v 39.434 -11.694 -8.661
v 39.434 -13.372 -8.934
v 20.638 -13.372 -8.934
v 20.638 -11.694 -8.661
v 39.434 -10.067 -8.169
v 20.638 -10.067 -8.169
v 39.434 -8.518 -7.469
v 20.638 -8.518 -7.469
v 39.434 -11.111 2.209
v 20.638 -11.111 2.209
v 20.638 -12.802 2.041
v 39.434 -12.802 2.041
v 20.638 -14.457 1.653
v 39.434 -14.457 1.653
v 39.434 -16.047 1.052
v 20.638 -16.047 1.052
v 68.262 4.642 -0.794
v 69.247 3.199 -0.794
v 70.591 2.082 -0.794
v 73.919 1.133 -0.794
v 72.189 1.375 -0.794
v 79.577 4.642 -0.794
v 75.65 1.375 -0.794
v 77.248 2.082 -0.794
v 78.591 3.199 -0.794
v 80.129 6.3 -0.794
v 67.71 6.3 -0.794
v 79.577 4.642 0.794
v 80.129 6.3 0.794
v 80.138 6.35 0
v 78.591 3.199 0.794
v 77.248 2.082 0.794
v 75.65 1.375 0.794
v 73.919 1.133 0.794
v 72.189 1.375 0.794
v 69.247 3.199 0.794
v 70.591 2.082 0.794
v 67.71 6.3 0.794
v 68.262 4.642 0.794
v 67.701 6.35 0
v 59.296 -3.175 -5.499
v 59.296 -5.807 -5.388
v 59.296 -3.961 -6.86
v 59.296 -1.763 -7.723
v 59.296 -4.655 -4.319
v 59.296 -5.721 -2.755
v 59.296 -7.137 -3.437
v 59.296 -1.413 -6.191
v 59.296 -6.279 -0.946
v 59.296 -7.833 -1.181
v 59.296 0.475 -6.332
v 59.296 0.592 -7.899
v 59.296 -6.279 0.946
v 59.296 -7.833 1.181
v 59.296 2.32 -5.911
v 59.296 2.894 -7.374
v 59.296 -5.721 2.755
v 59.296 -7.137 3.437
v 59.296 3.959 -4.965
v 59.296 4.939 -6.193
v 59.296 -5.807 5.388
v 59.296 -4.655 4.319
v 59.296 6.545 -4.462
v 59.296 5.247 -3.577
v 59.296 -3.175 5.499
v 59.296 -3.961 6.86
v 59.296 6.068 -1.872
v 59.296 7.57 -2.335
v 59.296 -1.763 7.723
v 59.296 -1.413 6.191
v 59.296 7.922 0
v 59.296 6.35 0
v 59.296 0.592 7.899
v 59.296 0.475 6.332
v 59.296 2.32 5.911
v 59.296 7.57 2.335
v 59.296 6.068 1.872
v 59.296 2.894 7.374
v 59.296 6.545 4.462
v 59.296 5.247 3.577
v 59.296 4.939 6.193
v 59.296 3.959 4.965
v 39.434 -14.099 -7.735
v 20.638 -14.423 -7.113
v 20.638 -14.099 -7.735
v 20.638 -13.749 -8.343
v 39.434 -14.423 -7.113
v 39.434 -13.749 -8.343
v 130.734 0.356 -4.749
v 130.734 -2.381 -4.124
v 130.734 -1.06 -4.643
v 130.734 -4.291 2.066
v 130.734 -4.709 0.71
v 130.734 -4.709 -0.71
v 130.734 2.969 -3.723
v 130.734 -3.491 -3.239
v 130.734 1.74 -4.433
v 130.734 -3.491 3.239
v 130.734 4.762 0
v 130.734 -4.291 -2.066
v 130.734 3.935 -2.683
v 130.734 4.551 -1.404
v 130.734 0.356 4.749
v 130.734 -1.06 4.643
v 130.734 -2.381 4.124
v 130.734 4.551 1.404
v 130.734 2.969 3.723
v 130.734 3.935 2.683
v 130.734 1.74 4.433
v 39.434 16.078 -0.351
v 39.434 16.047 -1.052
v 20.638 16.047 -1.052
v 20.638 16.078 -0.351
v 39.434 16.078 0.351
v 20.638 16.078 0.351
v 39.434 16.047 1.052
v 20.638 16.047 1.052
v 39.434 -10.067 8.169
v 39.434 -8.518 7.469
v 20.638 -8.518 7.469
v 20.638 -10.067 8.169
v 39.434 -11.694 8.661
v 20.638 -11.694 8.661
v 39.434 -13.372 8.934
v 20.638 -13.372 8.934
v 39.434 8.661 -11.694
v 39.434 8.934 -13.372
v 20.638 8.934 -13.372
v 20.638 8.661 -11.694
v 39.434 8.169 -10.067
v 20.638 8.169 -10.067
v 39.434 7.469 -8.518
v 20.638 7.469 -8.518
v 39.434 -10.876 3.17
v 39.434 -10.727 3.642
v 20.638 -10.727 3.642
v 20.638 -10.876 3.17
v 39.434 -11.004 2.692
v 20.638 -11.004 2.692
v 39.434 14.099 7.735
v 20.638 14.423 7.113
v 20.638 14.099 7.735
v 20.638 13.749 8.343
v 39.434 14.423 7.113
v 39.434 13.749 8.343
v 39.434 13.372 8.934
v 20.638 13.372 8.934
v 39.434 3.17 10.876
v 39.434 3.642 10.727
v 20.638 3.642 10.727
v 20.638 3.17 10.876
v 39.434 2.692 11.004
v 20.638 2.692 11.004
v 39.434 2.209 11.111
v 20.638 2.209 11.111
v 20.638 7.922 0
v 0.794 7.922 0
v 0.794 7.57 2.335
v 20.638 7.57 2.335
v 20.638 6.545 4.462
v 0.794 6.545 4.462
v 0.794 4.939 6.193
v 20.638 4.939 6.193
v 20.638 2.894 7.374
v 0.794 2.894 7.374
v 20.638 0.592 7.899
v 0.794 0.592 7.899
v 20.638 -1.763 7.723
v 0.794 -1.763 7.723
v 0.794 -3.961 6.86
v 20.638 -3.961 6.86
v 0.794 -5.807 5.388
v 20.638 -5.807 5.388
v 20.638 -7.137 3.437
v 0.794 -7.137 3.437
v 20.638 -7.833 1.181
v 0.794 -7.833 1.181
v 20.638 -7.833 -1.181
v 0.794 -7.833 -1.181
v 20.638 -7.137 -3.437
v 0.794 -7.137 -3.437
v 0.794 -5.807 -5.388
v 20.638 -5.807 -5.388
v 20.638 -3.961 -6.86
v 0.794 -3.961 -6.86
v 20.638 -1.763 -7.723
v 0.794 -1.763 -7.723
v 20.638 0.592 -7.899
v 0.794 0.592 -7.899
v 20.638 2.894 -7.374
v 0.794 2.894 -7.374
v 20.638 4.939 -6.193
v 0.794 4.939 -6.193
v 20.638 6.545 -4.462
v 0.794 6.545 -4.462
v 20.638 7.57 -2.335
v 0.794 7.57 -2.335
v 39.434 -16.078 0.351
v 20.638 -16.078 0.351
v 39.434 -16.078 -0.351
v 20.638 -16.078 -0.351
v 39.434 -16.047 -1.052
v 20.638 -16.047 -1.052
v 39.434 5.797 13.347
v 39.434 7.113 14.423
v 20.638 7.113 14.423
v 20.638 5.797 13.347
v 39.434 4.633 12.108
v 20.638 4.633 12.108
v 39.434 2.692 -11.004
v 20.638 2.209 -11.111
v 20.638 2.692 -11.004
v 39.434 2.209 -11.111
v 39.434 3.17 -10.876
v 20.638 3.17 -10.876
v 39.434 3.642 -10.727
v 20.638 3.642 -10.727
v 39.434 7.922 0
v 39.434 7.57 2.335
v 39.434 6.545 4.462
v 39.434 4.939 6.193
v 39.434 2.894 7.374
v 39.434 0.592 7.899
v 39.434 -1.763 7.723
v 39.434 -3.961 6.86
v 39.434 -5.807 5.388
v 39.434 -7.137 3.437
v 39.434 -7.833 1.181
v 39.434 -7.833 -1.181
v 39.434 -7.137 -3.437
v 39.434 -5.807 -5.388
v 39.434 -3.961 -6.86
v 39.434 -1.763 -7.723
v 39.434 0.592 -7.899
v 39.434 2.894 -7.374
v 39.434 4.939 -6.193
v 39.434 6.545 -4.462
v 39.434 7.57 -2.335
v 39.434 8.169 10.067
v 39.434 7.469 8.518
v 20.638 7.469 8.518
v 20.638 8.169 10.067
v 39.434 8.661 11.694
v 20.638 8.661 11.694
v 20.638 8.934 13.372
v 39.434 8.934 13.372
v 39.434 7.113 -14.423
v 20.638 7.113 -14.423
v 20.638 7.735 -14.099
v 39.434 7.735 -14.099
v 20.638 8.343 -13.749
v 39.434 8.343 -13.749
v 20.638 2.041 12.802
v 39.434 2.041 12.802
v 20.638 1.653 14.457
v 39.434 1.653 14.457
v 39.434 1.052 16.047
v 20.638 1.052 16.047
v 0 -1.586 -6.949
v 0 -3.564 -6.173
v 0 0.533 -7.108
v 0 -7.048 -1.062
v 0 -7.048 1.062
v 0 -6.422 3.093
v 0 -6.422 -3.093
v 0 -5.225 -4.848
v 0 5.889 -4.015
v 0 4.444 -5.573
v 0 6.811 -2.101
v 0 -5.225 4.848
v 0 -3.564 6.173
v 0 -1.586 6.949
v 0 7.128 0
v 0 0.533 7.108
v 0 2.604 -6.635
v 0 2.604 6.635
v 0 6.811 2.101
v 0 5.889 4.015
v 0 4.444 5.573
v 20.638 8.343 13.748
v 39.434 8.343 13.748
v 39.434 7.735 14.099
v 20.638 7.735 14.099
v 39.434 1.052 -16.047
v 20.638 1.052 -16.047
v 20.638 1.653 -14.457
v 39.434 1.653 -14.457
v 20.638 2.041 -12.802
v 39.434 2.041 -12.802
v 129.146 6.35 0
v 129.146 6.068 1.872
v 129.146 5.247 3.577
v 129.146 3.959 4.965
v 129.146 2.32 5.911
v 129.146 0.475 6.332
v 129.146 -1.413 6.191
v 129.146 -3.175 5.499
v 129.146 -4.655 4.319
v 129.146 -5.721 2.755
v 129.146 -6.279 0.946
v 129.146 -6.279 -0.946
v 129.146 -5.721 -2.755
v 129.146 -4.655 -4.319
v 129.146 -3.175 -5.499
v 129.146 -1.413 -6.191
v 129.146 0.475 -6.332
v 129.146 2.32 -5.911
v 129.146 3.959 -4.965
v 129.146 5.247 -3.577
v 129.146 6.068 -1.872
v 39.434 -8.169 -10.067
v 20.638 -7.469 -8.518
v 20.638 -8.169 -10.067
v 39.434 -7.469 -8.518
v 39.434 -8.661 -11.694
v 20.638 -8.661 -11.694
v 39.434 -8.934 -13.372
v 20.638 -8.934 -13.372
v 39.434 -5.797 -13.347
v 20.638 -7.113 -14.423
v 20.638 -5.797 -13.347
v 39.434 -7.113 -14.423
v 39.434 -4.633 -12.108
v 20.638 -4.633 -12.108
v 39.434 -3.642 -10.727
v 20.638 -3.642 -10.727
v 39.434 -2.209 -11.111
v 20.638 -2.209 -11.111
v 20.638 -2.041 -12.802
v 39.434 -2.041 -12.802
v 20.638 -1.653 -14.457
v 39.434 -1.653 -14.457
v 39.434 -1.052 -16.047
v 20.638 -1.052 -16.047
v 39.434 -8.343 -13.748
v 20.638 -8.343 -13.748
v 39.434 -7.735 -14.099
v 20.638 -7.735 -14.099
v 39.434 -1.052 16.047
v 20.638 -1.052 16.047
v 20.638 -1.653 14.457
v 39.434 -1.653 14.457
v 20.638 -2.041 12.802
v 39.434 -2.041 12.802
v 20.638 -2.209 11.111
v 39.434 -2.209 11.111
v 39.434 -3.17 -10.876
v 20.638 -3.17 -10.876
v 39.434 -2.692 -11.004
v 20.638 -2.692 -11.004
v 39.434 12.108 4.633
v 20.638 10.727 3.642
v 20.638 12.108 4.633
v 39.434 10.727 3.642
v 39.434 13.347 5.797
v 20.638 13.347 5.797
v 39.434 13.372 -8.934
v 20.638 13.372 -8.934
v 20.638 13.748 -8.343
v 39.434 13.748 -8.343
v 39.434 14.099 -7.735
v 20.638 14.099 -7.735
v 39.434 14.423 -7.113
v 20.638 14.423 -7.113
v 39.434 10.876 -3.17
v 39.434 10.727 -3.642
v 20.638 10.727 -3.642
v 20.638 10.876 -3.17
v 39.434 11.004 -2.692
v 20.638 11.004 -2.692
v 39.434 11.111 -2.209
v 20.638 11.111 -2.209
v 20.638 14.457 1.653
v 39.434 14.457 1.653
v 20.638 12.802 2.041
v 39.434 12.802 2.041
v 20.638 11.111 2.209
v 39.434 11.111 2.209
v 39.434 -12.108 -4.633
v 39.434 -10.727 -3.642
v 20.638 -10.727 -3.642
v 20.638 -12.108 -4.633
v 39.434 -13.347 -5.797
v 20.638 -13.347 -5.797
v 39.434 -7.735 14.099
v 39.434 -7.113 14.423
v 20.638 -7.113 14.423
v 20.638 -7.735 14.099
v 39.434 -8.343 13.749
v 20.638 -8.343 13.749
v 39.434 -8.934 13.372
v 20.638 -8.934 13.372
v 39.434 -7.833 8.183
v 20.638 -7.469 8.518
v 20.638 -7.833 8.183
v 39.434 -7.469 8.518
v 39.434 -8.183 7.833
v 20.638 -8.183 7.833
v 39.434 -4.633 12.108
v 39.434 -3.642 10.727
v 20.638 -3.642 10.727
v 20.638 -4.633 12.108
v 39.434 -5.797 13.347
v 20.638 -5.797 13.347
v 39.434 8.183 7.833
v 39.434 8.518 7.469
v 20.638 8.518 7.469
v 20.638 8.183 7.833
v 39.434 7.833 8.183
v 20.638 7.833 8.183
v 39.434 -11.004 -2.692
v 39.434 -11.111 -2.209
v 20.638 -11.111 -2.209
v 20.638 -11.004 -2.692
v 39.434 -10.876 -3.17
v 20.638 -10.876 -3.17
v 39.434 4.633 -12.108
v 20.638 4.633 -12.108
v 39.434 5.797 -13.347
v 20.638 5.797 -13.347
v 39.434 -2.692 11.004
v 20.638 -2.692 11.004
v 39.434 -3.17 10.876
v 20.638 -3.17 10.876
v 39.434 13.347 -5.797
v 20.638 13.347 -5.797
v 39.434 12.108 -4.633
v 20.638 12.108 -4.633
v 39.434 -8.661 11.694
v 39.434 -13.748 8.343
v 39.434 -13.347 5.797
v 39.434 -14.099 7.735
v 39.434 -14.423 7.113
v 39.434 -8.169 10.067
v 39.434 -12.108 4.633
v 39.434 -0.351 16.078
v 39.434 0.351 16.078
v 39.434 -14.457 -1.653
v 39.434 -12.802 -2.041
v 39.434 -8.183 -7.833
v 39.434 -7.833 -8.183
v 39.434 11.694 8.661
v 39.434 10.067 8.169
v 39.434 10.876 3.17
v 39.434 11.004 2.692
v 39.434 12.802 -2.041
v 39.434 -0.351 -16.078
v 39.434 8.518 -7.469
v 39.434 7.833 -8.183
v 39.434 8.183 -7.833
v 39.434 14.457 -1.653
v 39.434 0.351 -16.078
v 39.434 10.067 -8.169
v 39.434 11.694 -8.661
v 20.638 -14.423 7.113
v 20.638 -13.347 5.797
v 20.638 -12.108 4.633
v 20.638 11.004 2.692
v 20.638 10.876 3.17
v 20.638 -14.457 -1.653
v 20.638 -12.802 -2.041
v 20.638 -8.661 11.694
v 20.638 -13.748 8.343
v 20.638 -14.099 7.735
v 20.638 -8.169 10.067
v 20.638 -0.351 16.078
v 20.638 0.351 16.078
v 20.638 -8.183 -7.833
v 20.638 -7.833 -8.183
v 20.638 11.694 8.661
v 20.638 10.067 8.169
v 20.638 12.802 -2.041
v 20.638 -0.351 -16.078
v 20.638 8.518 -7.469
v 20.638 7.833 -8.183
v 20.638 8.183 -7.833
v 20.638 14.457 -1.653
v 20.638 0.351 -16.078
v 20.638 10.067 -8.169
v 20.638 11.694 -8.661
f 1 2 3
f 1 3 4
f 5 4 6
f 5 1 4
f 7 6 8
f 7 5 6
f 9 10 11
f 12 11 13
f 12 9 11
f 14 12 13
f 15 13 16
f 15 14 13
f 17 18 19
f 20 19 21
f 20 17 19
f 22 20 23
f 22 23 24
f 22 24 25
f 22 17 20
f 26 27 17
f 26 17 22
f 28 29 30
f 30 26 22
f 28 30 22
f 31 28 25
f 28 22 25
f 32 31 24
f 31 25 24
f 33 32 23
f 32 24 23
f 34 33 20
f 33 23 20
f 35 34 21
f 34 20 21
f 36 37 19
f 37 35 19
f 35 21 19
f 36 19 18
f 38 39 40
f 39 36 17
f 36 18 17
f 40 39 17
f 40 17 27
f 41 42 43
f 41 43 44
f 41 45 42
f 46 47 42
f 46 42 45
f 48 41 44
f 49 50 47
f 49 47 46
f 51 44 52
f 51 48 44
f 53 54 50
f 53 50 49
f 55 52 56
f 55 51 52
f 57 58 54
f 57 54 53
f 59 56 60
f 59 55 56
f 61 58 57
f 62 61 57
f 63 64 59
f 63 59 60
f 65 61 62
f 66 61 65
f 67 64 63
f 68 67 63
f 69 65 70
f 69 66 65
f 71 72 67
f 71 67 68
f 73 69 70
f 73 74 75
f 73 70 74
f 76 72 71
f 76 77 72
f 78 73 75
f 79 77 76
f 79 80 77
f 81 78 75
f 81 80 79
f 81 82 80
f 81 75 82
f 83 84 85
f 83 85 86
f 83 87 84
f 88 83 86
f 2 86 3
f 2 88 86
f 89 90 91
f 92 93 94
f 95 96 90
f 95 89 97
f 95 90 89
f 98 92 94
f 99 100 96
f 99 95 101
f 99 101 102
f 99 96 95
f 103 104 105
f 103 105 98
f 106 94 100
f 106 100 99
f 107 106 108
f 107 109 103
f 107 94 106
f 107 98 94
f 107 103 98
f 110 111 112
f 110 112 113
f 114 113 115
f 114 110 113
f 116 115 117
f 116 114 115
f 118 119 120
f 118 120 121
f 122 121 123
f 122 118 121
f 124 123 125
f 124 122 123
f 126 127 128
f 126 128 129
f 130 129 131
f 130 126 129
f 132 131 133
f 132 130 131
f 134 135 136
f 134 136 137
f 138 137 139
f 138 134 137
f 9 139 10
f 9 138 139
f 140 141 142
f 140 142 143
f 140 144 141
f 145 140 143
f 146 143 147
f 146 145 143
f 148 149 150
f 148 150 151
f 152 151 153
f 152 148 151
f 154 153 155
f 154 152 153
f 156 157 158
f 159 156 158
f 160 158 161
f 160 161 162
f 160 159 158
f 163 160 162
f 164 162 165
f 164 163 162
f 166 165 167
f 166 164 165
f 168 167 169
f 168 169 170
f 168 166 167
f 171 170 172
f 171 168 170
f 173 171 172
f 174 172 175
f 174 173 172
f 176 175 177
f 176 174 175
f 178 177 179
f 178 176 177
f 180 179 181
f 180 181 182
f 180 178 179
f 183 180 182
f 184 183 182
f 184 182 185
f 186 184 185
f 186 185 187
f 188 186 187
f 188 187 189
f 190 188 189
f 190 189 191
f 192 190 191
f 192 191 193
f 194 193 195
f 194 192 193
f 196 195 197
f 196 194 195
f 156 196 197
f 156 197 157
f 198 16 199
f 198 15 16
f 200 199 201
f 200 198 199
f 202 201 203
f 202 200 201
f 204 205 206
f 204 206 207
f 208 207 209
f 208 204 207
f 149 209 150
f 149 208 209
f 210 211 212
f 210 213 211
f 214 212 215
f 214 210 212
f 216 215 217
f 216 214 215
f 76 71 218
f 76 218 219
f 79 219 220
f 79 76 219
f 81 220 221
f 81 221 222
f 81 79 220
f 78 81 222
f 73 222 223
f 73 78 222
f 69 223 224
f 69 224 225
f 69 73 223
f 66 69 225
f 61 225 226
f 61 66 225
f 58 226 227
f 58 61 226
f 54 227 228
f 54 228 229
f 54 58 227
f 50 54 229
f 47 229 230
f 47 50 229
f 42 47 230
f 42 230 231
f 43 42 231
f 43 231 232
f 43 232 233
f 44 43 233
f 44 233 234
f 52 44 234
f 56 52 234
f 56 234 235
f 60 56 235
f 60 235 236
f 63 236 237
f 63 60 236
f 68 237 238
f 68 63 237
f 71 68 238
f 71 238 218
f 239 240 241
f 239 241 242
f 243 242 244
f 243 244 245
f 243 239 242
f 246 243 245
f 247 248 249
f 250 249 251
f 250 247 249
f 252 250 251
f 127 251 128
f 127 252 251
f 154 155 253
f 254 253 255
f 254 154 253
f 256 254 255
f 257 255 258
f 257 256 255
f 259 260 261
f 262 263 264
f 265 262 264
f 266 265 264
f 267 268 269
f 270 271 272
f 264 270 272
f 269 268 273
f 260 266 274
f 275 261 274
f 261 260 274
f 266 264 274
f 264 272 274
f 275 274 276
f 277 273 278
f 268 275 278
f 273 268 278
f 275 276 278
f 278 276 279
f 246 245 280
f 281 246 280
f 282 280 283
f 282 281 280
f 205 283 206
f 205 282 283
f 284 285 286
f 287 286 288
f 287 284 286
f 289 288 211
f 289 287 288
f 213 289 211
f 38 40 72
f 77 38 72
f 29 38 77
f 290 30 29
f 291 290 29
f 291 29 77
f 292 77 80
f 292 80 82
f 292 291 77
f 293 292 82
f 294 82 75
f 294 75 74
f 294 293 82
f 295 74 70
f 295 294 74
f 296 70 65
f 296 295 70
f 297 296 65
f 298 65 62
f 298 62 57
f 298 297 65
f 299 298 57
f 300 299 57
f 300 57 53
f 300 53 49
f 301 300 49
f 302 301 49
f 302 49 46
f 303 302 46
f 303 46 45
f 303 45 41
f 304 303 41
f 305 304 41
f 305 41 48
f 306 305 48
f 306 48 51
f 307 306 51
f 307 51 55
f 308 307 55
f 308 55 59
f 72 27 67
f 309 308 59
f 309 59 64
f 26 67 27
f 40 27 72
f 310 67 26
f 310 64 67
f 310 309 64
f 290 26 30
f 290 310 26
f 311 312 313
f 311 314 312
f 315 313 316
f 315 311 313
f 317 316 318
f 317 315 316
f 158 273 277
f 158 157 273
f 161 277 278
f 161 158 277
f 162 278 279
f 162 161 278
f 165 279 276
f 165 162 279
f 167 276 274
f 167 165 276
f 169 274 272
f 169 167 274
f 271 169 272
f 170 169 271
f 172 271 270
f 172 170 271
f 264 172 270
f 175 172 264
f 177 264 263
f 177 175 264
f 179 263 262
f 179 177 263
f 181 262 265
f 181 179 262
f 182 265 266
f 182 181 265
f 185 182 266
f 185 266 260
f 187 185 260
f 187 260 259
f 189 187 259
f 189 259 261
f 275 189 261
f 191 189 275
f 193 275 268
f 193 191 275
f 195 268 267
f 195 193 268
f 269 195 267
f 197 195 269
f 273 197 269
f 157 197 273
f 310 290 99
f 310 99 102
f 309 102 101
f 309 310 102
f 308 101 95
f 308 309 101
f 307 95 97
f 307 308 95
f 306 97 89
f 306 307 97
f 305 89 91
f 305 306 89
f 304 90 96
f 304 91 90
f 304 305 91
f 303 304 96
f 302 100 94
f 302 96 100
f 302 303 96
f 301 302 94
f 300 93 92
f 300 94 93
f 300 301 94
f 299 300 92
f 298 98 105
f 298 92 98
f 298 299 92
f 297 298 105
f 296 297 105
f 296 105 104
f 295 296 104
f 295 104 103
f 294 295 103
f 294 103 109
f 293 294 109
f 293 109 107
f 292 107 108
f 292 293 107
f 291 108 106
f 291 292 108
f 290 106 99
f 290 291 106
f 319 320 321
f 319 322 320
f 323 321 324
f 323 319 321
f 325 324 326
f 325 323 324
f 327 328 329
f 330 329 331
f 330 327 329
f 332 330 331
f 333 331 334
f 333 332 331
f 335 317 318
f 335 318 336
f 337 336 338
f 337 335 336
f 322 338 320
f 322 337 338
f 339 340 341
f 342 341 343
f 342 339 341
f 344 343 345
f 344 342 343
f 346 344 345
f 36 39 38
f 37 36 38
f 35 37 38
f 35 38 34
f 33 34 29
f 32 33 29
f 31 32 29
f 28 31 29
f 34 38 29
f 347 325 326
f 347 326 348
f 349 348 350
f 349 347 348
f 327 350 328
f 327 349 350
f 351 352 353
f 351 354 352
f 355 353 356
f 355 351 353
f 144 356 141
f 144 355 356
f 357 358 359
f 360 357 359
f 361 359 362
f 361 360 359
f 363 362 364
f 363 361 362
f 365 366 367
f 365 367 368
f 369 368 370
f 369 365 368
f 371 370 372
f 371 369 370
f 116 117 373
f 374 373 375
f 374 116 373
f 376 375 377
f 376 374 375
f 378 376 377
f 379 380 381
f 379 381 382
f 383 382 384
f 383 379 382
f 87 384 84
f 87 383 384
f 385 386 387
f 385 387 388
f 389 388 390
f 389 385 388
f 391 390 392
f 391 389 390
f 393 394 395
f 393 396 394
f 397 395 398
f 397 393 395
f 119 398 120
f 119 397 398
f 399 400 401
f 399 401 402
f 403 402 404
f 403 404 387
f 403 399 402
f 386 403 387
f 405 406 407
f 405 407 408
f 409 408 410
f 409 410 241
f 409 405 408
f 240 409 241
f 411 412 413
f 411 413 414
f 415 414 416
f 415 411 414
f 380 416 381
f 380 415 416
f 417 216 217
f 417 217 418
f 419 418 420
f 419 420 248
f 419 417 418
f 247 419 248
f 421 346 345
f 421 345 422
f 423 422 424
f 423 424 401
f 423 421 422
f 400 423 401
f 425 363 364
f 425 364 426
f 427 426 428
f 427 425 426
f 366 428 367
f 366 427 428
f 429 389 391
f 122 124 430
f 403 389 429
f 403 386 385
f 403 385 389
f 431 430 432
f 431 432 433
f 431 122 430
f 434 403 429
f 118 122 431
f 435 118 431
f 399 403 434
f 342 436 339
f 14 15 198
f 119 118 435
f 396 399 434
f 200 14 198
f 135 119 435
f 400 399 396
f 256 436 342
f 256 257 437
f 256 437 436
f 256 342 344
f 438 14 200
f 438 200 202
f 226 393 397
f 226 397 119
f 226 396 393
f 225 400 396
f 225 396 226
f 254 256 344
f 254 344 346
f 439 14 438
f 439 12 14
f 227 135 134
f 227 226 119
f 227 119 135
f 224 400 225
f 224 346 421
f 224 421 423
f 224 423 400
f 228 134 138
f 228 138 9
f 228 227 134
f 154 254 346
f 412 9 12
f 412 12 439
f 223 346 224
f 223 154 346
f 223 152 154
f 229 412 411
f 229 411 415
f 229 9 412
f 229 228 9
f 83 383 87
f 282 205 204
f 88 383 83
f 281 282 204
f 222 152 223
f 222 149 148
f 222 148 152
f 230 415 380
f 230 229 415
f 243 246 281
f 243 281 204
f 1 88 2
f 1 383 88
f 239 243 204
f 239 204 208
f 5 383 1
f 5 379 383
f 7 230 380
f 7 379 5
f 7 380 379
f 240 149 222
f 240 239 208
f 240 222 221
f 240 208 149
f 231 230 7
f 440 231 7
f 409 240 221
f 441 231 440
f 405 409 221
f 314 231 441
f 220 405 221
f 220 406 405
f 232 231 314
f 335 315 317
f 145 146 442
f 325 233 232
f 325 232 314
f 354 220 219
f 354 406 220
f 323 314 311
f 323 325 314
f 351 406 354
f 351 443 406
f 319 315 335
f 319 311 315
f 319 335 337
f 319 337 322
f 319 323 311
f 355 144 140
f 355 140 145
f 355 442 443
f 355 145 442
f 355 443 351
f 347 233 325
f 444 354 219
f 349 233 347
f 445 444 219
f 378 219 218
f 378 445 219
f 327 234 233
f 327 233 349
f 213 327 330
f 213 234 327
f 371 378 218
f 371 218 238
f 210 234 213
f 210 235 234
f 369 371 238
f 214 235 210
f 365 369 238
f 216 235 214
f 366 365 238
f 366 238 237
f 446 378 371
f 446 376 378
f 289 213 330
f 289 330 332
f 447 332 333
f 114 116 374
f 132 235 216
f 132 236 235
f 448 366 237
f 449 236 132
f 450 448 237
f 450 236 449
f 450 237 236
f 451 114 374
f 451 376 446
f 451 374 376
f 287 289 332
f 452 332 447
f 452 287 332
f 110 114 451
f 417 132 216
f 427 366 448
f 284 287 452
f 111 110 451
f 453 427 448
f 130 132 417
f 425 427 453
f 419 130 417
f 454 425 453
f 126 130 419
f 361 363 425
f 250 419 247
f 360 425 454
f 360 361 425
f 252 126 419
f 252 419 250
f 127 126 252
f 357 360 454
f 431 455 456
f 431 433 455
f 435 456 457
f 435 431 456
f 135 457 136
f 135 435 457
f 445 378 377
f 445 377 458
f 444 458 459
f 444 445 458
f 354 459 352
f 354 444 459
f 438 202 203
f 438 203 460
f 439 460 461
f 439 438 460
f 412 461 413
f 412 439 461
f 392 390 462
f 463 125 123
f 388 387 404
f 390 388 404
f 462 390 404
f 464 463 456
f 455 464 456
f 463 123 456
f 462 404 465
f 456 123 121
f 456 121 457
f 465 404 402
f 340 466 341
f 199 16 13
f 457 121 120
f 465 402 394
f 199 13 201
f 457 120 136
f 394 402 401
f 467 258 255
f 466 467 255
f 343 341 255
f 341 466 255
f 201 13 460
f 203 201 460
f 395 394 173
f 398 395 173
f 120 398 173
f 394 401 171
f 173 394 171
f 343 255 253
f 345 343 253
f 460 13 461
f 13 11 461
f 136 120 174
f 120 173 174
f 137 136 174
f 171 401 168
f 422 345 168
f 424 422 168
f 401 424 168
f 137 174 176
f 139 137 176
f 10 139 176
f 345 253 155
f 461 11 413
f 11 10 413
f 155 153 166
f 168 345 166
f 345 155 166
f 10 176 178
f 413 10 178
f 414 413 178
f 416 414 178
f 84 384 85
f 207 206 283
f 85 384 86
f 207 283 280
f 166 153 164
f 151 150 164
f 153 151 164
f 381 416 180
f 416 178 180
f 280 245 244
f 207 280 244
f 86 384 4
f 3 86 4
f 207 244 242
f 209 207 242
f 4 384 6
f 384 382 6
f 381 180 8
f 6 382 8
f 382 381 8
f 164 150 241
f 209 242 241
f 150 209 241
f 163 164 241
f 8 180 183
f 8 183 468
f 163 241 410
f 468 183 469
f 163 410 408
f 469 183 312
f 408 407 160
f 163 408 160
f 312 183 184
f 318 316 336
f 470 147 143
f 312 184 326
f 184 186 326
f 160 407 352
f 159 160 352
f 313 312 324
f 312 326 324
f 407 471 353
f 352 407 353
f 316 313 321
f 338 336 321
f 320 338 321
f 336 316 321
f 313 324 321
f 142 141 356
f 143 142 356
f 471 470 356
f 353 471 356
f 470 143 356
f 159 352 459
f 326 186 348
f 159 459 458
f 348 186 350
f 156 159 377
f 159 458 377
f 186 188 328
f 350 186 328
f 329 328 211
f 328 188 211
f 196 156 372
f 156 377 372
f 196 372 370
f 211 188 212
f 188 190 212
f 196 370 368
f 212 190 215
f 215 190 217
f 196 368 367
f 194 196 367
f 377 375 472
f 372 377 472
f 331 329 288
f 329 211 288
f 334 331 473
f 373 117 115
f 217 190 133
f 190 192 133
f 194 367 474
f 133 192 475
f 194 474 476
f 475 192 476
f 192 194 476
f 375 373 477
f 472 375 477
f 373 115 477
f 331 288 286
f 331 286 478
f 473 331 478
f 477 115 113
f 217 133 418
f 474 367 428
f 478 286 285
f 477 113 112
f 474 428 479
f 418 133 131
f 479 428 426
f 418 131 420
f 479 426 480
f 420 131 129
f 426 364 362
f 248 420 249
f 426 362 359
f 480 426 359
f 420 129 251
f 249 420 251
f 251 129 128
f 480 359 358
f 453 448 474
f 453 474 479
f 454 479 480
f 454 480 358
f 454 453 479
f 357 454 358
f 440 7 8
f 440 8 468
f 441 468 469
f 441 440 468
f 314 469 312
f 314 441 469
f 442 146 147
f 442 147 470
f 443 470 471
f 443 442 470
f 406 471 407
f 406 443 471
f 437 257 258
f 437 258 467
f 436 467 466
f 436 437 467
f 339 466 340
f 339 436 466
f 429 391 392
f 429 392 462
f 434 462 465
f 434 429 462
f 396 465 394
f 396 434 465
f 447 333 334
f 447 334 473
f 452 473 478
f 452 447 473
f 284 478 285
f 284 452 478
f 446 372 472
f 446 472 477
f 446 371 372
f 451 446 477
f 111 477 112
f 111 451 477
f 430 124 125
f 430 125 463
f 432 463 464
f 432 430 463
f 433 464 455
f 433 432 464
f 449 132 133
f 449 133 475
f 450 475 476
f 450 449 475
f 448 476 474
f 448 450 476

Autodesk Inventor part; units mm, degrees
ref_plane "Start Plane" through (0, 0, 0) normal (1, 0, 0) x (0, 1, 0)
ref_plane "XZ Plane" through (0, 0, 0) normal (0, 1, 0) x (-1, 0, 0)
ref_plane "XY Plane" through (0, 0, 0) normal (0, 0, 1) x (1, 0, 0)
sketch "Main Sketch" plane through (0, 0, 0) normal (0, 0, 1) x (1, 0, 0)
  line L0 (0, 0) -> (130.7338, 0)
  line L1 (0, 0) -> (0, 7.9216)
  line L2 (0, 7.9216) -> (20.6375, 7.9216)
  line L3 (20.6375, 7.9216) -> (20.6375, 11.3284)
  line L4 (39.4335, 11.3284) -> (39.4335, 7.9216)
  line L5 (20.6375, 11.3284) -> (39.4335, 11.3284)
  line L6 (59.2963, 7.9216) -> (59.2963, 6.35)
  line L7 (39.4335, 7.9216) -> (59.2963, 7.9216)
  line L8 (130.7338, 6.35) -> (130.7338, 0)
  line L9 (59.2963, 6.35) -> (130.7338, 6.35)
  dimension "d3" = 15.8432
  dimension "d4" = 22.6568
  dimension "d5" = 15.8432
  dimension "d6" = 12.7
revolve "Revolution1" add sketch "Main Sketch" angle 360 about axis through (0, 0, 0) along (1, 0, 0)
chamfer "Chamfer1" distance 0.7937 angle 45 1 edges at (0, -7.9216, 0) measured on face at (13.7583, 7.8959, -0.6374)
chamfer "Chamfer2" distance 1.5875 angle 45 1 edges at (130.7338, -6.35, 0) measured on face at (106.9213, 6.2678, -1.0186)
thread "Thread1" size "1/2-13 UNC" class "2A" standard "ANSI Unified Screw Threads" length 25.4
sketch "Sketch3" plane through (0, 0, 0) normal (0, 0, 1) x (1, 0, 0)
  arc A0 (67.6045, 7.4481) -> (80.2341, 7.4481) centre (73.9193, 7.4481) ccw
  line L0 (67.6045, 7.4481) -> (80.2341, 7.4481)
  line L1 (59.2963, -7.9216) -> (59.2963, 7.9216) construction
  point P0 (0, 0)
  dimension "d16" = 14.623
  dimension "d17" = 6.3148
extrude "Extrusion1" cut sketch "Sketch3" along normal mid plane 1.5875
sketch "Sketch4" plane through (39.4335, 0, 0) normal (1, 0, 0) x (0, 0, -1)
  arc A0 (-8.9345, 13.3715) -> (-7.4665, 8.514) centre (3.948, 14.6141) ccw
  arc A1 (-7.4665, 8.514) -> (-8.514, 7.4665) centre (0, 0) ccw
  arc A2 (-8.514, 7.4665) -> (-13.3715, 8.9345) centre (-14.6141, -3.948) ccw
  arc A3 (-13.3715, 8.9345) -> (-14.4233, 7.1128) centre (0, 0) ccw
  arc A4 (-14.4233, 7.1128) -> (-10.7232, 3.64) centre (-3.888, 14.6302) ccw
  arc A5 (-10.7232, 3.64) -> (-11.1066, 2.2092) centre (0, 0) ccw
  arc A6 (-11.1066, 2.2092) -> (-16.0473, 1.0518) centre (-10.6822, -10.7261) ccw
  arc A7 (-16.0473, 1.0518) -> (-16.0473, -1.0518) centre (0, 0) ccw
  arc A8 (-16.0473, -1.0518) -> (-11.1066, -2.2092) centre (-10.6822, 10.7261) ccw
  arc A9 (-11.1066, -2.2092) -> (-10.7232, -3.64) centre (0, 0) ccw
  arc A10 (-10.7232, -3.64) -> (-14.4233, -7.1128) centre (-3.888, -14.6302) ccw
  arc A11 (-14.4233, -7.1128) -> (-13.3715, -8.9345) centre (0, 0) ccw
  arc A12 (-13.3715, -8.9345) -> (-8.514, -7.4665) centre (-14.6141, 3.948) ccw
  arc A13 (-8.514, -7.4665) -> (-7.4665, -8.514) centre (0, 0) ccw
  arc A14 (-7.4665, -8.514) -> (-8.9345, -13.3715) centre (3.948, -14.6141) ccw
  arc A15 (-8.9345, -13.3715) -> (-7.1128, -14.4233) centre (0, 0) ccw
  arc A16 (-7.1128, -14.4233) -> (-3.64, -10.7232) centre (-14.6302, -3.888) ccw
  arc A17 (-3.64, -10.7232) -> (-2.2092, -11.1066) centre (0, 0) ccw
  arc A18 (-2.2092, -11.1066) -> (-1.0518, -16.0473) centre (10.7261, -10.6822) ccw
  arc A19 (-1.0518, -16.0473) -> (1.0518, -16.0473) centre (0, 0) ccw
  arc A20 (1.0518, -16.0473) -> (2.2092, -11.1066) centre (-10.7261, -10.6822) ccw
  arc A21 (2.2092, -11.1066) -> (3.64, -10.7232) centre (0, 0) ccw
  arc A22 (3.64, -10.7232) -> (7.1128, -14.4233) centre (14.6302, -3.888) ccw
  arc A23 (7.1128, -14.4233) -> (8.9345, -13.3715) centre (0, 0) ccw
  arc A24 (8.9345, -13.3715) -> (7.4665, -8.514) centre (-3.948, -14.6141) ccw
  arc A25 (7.4665, -8.514) -> (8.514, -7.4665) centre (0, 0) ccw
  arc A26 (8.514, -7.4665) -> (13.3715, -8.9345) centre (14.6141, 3.948) ccw
  arc A27 (13.3715, -8.9345) -> (14.4233, -7.1128) centre (0, 0) ccw
  arc A28 (14.4233, -7.1128) -> (10.7232, -3.64) centre (3.888, -14.6302) ccw
  arc A29 (10.7232, -3.64) -> (11.1066, -2.2092) centre (0, 0) ccw
  arc A30 (11.1066, -2.2092) -> (16.0473, -1.0518) centre (10.6822, 10.7261) ccw
  arc A31 (16.0473, -1.0518) -> (16.0473, 1.0518) centre (0, 0) ccw
  arc A32 (16.0473, 1.0518) -> (11.1066, 2.2092) centre (10.6822, -10.7261) ccw
  arc A33 (11.1066, 2.2092) -> (10.7232, 3.64) centre (0, 0) ccw
  arc A34 (10.7232, 3.64) -> (14.4233, 7.1128) centre (3.888, 14.6302) ccw
  arc A35 (14.4233, 7.1128) -> (13.3715, 8.9345) centre (0, 0) ccw
  arc A36 (13.3715, 8.9345) -> (8.514, 7.4665) centre (14.6141, -3.948) ccw
  arc A37 (8.514, 7.4665) -> (7.4665, 8.514) centre (0, 0) ccw
  arc A38 (7.4665, 8.514) -> (8.9345, 13.3715) centre (-3.948, 14.6141) ccw
  arc A39 (8.9345, 13.3715) -> (7.1128, 14.4233) centre (0, 0) ccw
  arc A40 (7.1128, 14.4233) -> (3.64, 10.7232) centre (14.6302, 3.888) ccw
  arc A41 (3.64, 10.7232) -> (2.2092, 11.1066) centre (0, 0) ccw
  arc A42 (2.2092, 11.1066) -> (1.0518, 16.0473) centre (-10.7261, 10.6822) ccw
  arc A43 (1.0518, 16.0473) -> (-1.0518, 16.0473) centre (0, 0) ccw
  arc A44 (-1.0518, 16.0473) -> (-2.2092, 11.1066) centre (10.7261, 10.6822) ccw
  arc A45 (-2.2092, 11.1066) -> (-3.64, 10.7232) centre (0, 0) ccw
  arc A46 (-3.64, 10.7232) -> (-7.1128, 14.4233) centre (-14.6302, 3.888) ccw
  arc A47 (-7.1128, 14.4233) -> (-8.9345, 13.3715) centre (0, 0) ccw
extrude "Extrusion2" add sketch "Sketch4" against normal up to surface (18.796 mm away)
properties part number "Shaft" material "Aluminum 6061"
